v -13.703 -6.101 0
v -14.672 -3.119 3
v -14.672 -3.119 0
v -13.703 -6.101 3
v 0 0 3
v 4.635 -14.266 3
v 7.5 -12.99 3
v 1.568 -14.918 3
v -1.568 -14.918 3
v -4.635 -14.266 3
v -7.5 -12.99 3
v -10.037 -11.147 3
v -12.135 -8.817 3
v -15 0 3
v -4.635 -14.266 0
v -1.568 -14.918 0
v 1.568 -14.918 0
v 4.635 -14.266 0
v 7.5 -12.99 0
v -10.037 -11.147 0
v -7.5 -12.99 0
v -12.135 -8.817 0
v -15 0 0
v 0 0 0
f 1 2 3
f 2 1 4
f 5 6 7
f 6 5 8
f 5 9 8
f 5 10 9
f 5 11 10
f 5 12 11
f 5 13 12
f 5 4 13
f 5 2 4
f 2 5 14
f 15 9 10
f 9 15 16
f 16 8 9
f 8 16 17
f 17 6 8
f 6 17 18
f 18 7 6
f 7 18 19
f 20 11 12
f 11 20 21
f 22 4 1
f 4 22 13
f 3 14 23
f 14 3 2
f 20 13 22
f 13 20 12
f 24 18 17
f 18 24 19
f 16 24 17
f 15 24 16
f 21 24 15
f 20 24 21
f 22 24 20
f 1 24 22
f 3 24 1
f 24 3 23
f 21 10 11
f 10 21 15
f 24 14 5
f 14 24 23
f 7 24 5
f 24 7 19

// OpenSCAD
toleranta = 1;

module felie_pizza_difference( diametru, grosime, unghi_felie)

{
 difference() {   
cylinder ( h=grosime, r= diametru/2);
   translate([-diametru/2 - toleranta, -diametru/2 -toleranta, -toleranta]) 
     cube([diametru+2*toleranta, diametru/2+toleranta, grosime+2*toleranta]);
         rotate([0, 0, unghi_felie]) translate([-diametru/2-toleranta, 0, -toleranta])
     cube([diametru+2*toleranta, diametru/2+toleranta, grosime+2*toleranta]);
    }
 }
 //---------------------------------------------
  module felie_pizza_difference( diametru, grosime, unghi_felie)

{
 difference() {   
cylinder ( h=grosime, r= diametru/2); 
     translate([-diametru/2-toleranta, 0, -toleranta])
     cube([diametru+2*toleranta, diametru/2+toleranta, grosime+2*toleranta]);
     rotate([0, 0, -(90-unghi_felie)])cube([diametru/2+toleranta, diametru/2+toleranta, grosime+2*toleranta]);
    }
 } 
     
  //----------------------
  //felie_pizza_difference( diametru=30, grosime=3, unghi_felie=30);
 
 felie_pizza_difference( diametru=30, grosime=3, unghi_felie=30);
